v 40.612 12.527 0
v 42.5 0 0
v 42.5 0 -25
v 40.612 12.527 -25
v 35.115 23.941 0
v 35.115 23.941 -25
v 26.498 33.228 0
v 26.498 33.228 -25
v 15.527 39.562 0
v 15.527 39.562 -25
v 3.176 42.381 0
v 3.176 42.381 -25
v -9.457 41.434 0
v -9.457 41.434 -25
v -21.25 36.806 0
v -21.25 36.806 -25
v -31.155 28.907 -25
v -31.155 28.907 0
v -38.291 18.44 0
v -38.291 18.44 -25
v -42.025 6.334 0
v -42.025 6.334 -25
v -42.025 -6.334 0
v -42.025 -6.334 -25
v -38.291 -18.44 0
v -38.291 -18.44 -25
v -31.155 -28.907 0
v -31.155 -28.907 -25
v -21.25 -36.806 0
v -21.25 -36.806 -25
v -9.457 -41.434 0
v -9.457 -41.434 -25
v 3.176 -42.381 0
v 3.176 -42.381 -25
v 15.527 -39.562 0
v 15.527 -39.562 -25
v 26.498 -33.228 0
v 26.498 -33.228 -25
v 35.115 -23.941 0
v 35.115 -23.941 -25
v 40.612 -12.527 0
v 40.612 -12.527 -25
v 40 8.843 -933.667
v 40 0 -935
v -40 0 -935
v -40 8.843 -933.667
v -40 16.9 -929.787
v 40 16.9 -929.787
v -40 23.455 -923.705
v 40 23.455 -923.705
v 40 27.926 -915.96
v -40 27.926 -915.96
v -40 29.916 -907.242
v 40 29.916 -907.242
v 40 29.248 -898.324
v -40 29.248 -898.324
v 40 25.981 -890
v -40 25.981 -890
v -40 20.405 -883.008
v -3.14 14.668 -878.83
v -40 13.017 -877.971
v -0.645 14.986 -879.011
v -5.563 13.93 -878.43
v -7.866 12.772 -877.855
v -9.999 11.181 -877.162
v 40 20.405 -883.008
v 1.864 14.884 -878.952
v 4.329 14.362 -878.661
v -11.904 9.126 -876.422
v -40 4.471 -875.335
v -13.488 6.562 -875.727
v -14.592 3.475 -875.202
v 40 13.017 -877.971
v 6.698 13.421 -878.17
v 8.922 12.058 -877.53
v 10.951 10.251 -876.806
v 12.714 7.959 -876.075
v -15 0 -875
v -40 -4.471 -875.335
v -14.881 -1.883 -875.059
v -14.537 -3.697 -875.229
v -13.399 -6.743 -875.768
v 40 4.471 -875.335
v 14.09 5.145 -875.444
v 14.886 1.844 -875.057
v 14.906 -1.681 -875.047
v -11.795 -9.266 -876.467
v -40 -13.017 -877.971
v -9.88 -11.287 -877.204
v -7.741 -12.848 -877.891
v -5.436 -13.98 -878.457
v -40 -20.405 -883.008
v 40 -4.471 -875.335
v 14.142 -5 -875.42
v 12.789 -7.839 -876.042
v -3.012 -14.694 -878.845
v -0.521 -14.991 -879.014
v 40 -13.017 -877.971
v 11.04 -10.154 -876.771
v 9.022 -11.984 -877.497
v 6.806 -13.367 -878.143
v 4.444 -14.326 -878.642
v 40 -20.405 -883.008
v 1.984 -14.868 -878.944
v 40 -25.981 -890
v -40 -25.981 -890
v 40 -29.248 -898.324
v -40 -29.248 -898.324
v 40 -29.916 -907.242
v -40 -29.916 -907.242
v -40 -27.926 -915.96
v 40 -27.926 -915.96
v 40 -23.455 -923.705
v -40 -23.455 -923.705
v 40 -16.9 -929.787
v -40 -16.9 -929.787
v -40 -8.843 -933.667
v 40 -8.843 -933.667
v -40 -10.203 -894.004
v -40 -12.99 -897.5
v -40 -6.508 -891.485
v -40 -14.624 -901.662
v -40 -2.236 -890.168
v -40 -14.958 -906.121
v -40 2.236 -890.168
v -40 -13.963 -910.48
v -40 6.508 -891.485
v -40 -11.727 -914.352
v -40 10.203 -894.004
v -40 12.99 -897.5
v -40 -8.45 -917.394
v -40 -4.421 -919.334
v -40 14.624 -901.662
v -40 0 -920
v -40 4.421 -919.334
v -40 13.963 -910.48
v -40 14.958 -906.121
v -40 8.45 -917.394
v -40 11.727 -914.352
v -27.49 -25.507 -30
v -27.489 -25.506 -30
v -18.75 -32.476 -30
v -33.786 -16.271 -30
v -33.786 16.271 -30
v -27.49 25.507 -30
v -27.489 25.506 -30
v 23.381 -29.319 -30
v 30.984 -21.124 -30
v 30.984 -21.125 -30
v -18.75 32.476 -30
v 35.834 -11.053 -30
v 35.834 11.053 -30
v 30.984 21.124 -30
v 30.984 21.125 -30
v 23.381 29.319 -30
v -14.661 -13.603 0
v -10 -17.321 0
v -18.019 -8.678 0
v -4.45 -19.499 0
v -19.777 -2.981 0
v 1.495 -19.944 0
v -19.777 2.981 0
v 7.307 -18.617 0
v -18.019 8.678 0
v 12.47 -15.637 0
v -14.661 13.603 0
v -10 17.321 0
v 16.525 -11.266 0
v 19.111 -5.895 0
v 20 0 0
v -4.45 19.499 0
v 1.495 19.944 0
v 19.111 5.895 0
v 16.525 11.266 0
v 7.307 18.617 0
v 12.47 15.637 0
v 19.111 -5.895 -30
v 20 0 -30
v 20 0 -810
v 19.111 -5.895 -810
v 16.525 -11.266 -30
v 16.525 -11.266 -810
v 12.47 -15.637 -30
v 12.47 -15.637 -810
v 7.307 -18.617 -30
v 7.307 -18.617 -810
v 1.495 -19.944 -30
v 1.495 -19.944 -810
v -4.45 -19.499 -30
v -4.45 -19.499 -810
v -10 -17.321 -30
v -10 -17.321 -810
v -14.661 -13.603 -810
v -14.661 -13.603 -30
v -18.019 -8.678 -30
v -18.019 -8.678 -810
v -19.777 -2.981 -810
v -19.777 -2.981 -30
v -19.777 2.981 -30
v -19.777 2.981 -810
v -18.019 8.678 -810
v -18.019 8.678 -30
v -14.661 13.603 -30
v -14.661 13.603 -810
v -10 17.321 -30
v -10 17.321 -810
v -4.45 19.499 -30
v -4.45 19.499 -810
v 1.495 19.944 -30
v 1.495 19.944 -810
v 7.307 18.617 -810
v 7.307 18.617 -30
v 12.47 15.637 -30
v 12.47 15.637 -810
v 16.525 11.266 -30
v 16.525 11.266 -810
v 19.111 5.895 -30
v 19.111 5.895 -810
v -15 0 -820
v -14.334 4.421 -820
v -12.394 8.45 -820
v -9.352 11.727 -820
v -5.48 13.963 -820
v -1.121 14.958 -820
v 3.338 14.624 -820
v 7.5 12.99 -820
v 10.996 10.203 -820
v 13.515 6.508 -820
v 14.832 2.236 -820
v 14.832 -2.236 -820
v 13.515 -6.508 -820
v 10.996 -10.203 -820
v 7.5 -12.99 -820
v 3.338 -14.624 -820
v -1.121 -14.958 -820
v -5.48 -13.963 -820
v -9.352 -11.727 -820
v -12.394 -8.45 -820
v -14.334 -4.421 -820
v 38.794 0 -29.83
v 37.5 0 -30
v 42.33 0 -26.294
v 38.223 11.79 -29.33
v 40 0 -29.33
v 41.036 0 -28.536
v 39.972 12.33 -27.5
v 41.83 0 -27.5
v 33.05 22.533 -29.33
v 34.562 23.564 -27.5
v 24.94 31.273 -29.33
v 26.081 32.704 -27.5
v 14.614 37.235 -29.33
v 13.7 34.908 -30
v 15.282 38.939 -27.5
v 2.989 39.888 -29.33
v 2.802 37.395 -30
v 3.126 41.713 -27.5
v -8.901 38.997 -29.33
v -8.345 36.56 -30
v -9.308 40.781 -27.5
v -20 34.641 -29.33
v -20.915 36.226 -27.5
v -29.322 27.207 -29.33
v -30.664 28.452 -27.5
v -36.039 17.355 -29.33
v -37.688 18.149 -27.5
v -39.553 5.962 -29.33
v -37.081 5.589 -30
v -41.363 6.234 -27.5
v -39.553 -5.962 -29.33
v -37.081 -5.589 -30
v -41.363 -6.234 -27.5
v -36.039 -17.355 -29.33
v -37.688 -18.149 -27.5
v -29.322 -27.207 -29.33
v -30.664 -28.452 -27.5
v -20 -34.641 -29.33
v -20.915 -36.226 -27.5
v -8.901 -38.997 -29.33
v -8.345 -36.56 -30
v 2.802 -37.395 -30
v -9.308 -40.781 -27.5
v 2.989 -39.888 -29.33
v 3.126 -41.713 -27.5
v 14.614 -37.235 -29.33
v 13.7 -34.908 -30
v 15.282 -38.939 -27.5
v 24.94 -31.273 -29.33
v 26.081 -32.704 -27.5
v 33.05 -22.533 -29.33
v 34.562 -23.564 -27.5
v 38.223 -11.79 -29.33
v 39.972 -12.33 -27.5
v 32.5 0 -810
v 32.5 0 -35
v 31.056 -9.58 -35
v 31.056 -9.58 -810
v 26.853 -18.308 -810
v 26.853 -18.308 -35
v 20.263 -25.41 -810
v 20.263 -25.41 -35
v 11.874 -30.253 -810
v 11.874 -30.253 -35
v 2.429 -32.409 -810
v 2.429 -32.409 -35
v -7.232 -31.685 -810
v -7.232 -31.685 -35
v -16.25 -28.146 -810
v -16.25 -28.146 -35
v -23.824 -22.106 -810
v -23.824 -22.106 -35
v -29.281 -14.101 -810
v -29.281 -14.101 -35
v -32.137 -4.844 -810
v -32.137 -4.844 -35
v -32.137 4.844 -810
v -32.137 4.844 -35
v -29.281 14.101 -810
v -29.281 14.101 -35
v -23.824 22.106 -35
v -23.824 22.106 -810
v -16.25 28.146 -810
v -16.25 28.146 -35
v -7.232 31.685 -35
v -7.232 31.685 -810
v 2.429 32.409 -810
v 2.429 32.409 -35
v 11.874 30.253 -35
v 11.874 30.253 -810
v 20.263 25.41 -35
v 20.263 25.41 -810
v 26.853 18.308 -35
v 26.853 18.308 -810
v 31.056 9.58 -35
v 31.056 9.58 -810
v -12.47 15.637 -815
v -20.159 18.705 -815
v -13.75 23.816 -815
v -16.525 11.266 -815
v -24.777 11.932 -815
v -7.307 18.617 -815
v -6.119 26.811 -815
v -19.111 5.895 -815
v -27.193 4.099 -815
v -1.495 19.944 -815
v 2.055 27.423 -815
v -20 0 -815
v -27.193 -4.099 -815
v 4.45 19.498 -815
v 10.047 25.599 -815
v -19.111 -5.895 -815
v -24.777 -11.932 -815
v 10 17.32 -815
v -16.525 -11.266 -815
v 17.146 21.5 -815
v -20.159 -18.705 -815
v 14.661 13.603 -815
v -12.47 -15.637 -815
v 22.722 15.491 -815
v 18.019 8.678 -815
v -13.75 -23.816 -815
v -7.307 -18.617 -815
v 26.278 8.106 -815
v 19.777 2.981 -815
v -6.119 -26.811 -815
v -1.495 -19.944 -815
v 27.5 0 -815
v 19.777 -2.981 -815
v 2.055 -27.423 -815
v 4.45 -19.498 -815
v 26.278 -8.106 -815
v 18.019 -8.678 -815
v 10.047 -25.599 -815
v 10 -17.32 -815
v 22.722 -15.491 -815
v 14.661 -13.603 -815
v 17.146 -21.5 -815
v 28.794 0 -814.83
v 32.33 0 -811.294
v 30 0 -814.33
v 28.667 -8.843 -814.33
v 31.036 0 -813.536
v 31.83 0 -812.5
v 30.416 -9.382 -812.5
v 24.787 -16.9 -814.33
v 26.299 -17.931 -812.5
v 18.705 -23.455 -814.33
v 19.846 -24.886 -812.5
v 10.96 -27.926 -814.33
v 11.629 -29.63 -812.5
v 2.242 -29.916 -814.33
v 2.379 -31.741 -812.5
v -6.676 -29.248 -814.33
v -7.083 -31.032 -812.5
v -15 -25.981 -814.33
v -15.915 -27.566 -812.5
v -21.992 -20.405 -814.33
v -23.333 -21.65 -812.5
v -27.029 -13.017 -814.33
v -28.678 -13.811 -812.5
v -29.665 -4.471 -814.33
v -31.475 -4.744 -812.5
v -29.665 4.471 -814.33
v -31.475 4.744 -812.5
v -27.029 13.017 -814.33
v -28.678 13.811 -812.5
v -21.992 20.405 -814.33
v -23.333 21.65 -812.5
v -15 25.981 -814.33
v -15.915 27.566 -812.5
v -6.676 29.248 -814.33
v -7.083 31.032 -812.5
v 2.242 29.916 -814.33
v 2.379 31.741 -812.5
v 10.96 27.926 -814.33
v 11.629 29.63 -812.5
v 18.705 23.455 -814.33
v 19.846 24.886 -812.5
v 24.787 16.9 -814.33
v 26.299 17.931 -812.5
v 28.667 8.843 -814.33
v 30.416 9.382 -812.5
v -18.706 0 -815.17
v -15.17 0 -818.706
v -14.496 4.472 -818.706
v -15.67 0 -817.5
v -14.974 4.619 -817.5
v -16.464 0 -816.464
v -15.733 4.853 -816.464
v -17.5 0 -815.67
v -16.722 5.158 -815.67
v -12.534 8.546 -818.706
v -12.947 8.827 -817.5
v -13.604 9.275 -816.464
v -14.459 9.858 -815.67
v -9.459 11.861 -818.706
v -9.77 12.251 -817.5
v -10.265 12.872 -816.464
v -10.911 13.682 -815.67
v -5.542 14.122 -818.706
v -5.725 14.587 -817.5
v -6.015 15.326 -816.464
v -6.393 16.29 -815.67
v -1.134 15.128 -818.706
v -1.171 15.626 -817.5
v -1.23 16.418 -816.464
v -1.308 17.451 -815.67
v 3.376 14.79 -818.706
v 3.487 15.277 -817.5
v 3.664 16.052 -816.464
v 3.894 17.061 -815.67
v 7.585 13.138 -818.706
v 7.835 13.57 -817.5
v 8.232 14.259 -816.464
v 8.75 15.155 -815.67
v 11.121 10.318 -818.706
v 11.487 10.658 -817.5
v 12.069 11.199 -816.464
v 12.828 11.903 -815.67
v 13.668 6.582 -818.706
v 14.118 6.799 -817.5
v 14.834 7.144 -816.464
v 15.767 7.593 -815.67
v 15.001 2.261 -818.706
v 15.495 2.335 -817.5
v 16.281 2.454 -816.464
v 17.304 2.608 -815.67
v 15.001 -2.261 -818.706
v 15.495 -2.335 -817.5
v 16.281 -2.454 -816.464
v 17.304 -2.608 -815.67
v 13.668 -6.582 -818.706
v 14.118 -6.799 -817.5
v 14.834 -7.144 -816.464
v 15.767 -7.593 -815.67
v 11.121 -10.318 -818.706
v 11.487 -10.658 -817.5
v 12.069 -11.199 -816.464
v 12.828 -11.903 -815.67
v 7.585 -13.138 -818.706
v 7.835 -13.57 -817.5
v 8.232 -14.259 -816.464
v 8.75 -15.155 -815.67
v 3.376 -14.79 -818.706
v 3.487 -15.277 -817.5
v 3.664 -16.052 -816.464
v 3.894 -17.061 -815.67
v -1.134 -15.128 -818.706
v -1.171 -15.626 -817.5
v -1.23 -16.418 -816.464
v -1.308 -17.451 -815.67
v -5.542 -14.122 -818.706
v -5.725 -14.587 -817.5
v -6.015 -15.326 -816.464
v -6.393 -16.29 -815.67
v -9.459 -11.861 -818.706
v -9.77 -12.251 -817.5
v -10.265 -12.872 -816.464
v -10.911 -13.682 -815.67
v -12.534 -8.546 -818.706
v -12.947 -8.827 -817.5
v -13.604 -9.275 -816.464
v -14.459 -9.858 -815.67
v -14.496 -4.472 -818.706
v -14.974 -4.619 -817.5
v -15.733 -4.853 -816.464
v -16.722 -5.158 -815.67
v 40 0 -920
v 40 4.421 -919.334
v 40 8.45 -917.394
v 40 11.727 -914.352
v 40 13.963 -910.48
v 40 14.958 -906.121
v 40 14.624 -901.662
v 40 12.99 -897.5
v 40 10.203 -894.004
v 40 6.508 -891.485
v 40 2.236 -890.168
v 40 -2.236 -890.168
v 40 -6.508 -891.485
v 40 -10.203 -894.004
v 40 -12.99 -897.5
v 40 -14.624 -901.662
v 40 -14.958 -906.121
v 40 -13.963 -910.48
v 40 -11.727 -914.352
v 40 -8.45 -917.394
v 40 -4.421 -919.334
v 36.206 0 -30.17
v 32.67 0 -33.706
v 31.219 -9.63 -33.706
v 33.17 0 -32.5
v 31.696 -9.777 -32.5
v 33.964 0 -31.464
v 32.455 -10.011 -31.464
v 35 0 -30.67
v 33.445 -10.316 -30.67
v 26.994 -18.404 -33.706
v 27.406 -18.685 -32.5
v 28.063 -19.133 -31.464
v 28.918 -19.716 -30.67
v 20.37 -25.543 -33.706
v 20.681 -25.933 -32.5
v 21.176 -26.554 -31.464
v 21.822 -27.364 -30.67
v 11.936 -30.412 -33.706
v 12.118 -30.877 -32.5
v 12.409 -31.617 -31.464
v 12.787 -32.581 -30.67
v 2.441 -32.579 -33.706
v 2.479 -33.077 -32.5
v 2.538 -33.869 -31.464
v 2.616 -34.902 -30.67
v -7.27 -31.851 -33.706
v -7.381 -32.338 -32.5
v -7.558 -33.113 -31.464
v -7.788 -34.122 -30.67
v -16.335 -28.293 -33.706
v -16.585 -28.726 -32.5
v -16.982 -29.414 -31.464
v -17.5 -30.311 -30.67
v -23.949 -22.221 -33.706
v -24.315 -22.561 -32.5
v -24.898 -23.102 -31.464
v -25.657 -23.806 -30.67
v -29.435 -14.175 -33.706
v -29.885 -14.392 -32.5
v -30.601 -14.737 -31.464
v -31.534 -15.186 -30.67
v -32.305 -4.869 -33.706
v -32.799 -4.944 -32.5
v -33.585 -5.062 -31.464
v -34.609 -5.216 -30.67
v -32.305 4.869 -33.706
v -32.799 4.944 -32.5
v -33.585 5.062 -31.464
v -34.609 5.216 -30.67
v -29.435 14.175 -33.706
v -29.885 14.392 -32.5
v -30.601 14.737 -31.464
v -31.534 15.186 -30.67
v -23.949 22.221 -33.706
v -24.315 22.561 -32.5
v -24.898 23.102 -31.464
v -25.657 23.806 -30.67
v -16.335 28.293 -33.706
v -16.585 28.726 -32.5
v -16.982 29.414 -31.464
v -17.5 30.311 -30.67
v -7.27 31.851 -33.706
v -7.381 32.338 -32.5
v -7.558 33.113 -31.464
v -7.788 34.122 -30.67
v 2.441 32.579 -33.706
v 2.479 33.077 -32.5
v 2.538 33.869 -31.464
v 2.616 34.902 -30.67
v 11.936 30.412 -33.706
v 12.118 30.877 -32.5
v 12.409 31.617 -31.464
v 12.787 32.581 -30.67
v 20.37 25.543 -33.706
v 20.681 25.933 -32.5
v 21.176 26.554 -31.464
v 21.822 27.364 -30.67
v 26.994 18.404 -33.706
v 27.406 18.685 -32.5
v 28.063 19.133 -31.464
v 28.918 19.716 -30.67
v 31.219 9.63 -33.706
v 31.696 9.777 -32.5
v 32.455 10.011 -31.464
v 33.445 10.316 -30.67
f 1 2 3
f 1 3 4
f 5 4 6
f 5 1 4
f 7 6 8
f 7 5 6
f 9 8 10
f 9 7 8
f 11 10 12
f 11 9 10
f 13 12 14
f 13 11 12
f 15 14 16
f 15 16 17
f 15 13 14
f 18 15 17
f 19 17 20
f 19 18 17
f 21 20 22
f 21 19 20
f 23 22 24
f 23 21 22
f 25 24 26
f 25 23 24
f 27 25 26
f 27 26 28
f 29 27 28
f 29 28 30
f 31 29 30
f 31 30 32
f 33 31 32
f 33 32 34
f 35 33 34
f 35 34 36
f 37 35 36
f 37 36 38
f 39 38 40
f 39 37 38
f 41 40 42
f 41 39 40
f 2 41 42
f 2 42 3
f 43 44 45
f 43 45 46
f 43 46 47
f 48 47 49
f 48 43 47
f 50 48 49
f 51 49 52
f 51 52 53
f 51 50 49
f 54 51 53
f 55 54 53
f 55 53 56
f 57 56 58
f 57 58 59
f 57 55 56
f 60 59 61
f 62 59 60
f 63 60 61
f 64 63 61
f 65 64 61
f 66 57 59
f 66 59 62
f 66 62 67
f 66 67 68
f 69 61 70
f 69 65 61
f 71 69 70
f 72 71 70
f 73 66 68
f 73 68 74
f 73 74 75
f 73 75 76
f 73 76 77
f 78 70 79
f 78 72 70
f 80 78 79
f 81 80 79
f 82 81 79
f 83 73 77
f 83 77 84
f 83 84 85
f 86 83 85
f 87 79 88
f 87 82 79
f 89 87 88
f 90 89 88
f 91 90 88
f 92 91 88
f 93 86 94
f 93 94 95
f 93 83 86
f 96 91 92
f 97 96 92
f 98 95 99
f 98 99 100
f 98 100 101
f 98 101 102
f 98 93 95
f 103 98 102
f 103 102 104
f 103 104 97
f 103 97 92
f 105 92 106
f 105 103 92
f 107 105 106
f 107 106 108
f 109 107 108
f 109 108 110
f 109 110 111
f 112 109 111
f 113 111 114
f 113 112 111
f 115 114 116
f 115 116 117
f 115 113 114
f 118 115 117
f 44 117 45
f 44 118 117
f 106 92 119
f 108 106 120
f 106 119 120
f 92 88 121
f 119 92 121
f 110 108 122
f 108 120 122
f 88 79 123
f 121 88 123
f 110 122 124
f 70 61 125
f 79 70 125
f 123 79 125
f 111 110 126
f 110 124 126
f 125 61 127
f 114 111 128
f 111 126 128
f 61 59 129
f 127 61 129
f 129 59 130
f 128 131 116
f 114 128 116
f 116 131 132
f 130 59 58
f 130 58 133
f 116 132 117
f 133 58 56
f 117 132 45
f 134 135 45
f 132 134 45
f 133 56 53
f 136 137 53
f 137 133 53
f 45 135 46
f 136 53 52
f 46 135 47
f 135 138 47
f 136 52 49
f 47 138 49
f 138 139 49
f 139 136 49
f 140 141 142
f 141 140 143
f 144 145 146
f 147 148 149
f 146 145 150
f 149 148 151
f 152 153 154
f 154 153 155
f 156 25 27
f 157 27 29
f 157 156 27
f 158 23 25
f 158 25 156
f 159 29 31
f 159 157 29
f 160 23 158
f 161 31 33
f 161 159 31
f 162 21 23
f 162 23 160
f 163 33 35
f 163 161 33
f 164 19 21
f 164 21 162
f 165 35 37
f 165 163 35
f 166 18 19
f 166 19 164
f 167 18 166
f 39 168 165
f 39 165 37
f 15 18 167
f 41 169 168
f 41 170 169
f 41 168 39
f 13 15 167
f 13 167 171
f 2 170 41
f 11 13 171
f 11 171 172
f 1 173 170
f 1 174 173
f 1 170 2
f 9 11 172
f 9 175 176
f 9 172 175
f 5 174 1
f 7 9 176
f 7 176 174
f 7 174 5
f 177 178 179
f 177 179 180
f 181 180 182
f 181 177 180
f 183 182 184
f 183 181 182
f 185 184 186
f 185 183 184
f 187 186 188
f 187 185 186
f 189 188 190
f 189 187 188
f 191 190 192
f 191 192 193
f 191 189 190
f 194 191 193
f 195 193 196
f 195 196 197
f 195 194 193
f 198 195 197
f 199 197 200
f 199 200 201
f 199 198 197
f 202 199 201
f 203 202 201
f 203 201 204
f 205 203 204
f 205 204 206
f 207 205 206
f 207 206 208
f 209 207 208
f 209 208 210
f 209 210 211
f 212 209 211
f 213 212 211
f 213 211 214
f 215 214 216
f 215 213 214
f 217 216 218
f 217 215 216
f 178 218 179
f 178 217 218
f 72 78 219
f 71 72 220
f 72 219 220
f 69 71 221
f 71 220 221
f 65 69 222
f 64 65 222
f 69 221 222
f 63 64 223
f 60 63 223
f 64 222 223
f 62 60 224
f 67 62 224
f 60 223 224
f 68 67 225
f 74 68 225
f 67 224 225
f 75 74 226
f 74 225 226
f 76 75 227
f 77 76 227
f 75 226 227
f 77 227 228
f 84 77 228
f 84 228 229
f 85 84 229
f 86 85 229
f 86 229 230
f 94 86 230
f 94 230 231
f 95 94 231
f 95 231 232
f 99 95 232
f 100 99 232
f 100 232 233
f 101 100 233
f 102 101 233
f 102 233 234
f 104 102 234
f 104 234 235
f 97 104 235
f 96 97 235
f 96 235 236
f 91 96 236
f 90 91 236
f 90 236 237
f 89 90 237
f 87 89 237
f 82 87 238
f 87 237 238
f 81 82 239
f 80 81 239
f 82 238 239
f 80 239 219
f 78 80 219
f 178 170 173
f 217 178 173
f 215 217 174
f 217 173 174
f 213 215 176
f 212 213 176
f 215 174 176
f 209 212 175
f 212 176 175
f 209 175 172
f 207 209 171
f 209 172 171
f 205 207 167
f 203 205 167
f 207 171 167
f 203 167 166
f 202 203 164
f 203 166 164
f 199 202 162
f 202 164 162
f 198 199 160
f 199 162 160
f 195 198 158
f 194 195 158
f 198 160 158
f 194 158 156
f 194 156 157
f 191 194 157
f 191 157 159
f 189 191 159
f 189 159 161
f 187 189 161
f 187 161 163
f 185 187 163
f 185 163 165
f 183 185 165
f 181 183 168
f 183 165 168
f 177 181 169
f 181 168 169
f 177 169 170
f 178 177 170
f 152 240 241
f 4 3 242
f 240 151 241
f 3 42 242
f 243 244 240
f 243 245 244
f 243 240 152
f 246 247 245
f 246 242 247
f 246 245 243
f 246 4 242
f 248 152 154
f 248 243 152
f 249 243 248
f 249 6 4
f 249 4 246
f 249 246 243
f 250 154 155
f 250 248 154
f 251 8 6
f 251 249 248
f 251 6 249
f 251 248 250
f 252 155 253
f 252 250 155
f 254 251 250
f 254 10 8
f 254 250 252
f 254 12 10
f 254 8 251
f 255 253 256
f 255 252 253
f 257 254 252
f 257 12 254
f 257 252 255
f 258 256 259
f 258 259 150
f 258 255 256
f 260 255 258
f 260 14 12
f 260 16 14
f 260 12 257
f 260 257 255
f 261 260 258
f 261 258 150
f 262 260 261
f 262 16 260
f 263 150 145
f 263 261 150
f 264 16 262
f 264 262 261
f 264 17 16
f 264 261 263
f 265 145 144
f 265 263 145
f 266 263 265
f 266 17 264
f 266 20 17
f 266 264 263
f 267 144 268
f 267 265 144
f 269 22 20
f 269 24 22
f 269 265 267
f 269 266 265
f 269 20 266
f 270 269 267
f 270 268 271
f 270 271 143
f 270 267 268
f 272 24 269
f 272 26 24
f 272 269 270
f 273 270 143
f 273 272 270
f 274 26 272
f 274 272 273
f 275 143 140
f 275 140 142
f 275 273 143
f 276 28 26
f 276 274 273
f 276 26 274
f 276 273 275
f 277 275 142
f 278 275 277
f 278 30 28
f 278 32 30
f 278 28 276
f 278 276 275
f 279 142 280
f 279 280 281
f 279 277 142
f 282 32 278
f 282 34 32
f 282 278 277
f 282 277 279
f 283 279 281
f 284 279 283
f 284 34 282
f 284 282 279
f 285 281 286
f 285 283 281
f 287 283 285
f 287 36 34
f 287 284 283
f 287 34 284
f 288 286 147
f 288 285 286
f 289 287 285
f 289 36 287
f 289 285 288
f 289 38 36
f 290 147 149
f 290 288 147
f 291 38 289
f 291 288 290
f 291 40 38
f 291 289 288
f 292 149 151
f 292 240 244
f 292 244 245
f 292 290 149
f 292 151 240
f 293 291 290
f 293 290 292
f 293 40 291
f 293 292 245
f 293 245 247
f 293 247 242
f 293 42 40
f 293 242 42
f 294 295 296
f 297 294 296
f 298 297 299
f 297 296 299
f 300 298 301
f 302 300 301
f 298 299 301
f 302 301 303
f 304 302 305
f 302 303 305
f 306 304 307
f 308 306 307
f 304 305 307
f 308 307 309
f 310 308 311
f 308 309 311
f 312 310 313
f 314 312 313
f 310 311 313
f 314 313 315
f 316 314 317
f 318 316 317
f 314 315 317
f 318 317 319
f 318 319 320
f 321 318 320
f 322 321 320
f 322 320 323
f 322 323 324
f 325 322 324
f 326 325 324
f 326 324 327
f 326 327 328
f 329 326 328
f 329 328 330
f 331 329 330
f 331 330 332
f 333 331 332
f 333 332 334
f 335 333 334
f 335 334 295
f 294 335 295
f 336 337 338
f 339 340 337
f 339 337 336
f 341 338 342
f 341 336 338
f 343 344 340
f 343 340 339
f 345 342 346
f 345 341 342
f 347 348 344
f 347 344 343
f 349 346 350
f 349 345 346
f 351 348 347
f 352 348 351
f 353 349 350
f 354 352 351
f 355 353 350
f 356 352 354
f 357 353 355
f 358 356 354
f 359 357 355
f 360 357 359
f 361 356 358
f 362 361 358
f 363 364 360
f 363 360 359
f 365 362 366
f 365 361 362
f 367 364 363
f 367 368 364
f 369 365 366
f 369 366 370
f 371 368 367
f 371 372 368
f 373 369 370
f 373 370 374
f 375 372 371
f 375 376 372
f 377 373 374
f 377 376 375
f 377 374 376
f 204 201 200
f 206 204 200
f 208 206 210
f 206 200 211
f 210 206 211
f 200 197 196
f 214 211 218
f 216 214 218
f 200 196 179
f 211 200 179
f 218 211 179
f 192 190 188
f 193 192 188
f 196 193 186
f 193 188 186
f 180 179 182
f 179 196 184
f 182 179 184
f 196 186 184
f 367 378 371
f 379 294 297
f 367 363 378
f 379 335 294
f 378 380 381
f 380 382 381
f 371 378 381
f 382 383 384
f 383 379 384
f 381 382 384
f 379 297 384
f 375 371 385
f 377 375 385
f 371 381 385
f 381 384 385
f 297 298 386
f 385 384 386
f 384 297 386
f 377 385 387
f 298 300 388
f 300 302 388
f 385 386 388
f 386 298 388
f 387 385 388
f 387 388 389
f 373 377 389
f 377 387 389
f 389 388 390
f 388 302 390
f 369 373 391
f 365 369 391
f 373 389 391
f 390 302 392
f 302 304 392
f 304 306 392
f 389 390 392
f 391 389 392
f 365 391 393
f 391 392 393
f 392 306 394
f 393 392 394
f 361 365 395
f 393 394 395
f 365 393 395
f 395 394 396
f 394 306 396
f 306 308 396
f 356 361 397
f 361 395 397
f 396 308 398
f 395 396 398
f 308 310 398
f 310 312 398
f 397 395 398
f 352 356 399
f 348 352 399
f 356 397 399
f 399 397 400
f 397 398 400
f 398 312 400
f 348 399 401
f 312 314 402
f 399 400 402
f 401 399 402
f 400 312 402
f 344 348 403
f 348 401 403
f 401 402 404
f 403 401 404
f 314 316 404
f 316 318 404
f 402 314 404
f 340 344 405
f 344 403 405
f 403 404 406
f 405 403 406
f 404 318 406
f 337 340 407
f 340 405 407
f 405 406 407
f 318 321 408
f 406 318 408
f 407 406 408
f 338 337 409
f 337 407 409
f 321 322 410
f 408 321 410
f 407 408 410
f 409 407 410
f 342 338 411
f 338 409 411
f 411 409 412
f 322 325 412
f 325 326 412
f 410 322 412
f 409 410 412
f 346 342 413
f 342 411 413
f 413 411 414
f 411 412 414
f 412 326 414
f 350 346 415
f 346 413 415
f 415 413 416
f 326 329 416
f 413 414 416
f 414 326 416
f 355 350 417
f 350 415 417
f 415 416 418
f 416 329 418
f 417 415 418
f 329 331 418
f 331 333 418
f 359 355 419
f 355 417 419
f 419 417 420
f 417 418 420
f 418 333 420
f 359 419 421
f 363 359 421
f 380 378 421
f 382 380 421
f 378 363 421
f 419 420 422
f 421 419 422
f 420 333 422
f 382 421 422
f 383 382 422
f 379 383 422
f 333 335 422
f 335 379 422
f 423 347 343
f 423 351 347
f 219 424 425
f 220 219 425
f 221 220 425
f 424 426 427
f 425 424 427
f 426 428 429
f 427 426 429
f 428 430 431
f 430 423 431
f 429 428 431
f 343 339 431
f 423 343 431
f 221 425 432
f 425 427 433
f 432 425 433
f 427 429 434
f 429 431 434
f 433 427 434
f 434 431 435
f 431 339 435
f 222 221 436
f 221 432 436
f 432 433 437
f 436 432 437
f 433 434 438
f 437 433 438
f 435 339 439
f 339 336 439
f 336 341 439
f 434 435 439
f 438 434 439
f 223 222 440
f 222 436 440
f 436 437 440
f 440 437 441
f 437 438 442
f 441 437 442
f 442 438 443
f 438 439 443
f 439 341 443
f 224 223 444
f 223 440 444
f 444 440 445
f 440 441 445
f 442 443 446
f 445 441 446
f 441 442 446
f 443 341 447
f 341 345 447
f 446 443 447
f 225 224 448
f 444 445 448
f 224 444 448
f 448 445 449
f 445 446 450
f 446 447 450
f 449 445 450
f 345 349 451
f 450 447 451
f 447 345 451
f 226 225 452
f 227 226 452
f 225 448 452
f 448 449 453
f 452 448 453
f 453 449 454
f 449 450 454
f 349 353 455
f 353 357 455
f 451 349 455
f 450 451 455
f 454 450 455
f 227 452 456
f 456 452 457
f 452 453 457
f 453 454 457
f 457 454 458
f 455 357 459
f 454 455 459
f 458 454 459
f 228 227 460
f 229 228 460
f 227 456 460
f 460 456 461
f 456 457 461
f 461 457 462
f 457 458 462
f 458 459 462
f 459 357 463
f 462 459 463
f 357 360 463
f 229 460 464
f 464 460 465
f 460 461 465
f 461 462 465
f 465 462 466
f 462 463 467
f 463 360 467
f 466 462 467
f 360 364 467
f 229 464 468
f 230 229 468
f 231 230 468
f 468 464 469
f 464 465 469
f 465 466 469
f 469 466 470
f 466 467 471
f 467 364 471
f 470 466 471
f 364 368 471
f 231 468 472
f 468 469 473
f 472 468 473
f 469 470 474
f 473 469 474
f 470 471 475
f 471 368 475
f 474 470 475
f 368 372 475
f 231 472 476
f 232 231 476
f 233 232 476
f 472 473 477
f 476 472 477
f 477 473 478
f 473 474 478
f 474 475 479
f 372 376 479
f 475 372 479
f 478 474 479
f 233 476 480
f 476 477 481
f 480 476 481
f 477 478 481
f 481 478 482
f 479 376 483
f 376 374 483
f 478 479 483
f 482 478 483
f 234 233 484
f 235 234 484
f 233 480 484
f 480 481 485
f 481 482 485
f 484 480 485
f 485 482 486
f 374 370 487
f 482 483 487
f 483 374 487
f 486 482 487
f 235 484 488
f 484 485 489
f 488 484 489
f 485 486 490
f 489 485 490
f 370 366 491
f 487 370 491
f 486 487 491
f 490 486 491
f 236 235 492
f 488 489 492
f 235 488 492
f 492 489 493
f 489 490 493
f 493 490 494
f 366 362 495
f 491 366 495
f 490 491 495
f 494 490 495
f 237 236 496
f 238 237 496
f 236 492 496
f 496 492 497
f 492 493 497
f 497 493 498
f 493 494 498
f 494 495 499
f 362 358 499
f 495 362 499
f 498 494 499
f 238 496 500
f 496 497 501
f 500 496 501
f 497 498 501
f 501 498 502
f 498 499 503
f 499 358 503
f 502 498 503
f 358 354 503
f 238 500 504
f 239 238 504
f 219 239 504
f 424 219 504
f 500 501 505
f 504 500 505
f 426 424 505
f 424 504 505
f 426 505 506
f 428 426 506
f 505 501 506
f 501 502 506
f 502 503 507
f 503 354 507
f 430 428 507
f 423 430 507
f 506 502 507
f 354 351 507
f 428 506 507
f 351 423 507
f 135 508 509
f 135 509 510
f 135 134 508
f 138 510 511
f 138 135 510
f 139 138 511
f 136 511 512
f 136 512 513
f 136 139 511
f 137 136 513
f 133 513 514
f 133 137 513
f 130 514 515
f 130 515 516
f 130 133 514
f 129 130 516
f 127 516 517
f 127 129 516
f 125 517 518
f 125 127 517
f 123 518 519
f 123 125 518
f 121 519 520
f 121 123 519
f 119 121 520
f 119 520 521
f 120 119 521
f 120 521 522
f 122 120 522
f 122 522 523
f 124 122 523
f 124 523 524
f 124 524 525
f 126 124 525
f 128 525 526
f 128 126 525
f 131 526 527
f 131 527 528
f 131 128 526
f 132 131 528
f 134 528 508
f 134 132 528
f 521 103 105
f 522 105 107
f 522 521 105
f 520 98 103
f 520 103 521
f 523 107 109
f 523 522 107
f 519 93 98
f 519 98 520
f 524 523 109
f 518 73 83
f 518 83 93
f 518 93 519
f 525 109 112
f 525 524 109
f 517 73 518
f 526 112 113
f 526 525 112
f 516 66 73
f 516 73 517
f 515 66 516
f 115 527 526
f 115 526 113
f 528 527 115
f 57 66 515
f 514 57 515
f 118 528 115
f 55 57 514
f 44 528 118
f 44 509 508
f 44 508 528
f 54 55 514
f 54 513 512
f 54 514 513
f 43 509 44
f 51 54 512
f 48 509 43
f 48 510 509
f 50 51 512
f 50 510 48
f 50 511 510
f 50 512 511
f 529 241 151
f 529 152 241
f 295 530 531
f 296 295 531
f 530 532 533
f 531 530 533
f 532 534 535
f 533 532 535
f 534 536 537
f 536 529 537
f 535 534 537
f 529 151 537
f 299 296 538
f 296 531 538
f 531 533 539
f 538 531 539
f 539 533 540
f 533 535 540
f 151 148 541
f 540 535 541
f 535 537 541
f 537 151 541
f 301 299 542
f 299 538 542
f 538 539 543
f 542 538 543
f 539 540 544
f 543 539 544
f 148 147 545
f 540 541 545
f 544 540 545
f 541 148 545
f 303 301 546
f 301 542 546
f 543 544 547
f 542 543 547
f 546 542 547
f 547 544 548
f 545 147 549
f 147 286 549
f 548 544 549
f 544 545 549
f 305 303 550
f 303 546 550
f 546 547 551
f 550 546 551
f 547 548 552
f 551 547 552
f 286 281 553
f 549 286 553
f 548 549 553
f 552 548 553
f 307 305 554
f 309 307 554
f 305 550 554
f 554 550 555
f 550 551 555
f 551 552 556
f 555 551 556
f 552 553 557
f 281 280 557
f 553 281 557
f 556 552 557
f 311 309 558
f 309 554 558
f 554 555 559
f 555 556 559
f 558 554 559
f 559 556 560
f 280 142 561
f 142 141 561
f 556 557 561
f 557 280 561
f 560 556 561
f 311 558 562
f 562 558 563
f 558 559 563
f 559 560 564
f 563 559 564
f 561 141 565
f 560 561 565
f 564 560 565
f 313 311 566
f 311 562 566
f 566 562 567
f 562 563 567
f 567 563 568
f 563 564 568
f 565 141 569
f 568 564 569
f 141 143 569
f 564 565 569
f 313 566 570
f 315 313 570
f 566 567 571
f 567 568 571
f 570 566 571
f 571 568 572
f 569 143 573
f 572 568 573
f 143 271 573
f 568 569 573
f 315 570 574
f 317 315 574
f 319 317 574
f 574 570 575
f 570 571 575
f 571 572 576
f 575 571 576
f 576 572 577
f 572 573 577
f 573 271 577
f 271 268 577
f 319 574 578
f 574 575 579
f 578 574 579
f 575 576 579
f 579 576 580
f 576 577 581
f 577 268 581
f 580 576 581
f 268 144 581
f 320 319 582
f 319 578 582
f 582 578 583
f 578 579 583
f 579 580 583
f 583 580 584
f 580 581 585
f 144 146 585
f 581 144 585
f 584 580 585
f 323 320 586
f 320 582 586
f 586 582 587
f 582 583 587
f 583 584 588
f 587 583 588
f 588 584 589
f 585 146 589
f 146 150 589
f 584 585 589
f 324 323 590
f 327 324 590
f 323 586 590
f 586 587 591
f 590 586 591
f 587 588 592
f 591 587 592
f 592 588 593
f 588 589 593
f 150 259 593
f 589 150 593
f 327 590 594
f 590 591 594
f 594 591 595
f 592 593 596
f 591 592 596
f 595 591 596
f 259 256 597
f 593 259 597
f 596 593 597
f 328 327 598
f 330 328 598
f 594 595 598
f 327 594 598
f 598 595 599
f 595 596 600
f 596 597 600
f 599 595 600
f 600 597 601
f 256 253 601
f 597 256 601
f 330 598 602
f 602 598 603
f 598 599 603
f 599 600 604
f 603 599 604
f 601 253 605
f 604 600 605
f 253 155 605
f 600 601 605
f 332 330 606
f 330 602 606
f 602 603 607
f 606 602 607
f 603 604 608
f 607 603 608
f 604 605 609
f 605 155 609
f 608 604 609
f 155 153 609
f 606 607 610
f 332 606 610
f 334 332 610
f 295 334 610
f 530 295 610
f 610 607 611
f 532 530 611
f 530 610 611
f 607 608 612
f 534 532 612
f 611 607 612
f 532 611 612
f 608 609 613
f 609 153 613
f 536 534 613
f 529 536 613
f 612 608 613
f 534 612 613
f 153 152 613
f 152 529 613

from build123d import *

# Parameters (mm, degrees)
SKETCH1_R           = 42.5
SKETCH1_R_2         = 20
BOSS_EXTRUDE1_DEPTH = 30
SKETCH2_R           = 32.5
SKETCH2_R_2         = 20
BOSS_EXTRUDE2_DEPTH = 780
SKETCH3_R           = 32.5
BOSS_EXTRUDE3_DEPTH = 5
SKETCH4_R           = 15
BOSS_EXTRUDE4_DEPTH = 65
SKETCH5_R           = 30
SKETCH5_R_2         = 15
BOSS_EXTRUDE5_DEPTH = 40
FILLET1_R           = 5


with BuildPart() as part:
    # Sketch1 → Boss-Extrude1 (new body)
    with BuildSketch(Plane.XY):
        Circle(SKETCH1_R)
        Circle(SKETCH1_R_2, mode=Mode.SUBTRACT)
    extrude(amount=-BOSS_EXTRUDE1_DEPTH)

    # Sketch2 → Boss-Extrude2 (add)
    with BuildSketch(Plane(origin=(0, 0, -30), x_dir=(-1, 0, 0), z_dir=(0, 0, -1))):
        with Locations(Location((0, 0, 0), (0, 0, 180))):
            Circle(SKETCH2_R)
        with Locations(Location((0, 0, 0), (0, 0, 180))):
            Circle(SKETCH2_R_2, mode=Mode.SUBTRACT)
    extrude(amount=BOSS_EXTRUDE2_DEPTH)

    # Sketch3 → Boss-Extrude3 (add)
    with BuildSketch(Plane(origin=(0, 0, -810), x_dir=(-1, 0, 0), z_dir=(0, 0, -1))):
        with Locations(Location((0, 0, 0), (0, 0, 180))):
            Circle(SKETCH3_R)
    extrude(amount=BOSS_EXTRUDE3_DEPTH)

    # Sketch4 → Boss-Extrude4 (add)
    with BuildSketch(Plane(origin=(0, 0, -815), x_dir=(-1, 0, 0), z_dir=(0, 0, -1))):
        Circle(SKETCH4_R)
    extrude(amount=BOSS_EXTRUDE4_DEPTH)

    # Sketch5 → Boss-Extrude5 (add, symmetric)
    with BuildSketch(Plane(origin=(0, 0, 0), x_dir=(0, 0, -1), z_dir=(1, 0, 0))):
        with Locations((905, 0)):
            Circle(SKETCH5_R)
        with Locations((905, 0)):
            Circle(SKETCH5_R_2, mode=Mode.SUBTRACT)
    extrude(amount=BOSS_EXTRUDE5_DEPTH, both=True)

    # Fillet1
    fillet1_edges = [part.edges().sort_by_distance(p)[0] for p in [
        (-32.5, 0, -30),
        (-32.5, 0, -815),
        (15, 0, -815),
        (-42.5, 0, -30),
    ]]
    fillet(fillet1_edges, radius=FILLET1_R - 0.0001)  # a hair under: the kernel refuses the full size


solid = part.part
